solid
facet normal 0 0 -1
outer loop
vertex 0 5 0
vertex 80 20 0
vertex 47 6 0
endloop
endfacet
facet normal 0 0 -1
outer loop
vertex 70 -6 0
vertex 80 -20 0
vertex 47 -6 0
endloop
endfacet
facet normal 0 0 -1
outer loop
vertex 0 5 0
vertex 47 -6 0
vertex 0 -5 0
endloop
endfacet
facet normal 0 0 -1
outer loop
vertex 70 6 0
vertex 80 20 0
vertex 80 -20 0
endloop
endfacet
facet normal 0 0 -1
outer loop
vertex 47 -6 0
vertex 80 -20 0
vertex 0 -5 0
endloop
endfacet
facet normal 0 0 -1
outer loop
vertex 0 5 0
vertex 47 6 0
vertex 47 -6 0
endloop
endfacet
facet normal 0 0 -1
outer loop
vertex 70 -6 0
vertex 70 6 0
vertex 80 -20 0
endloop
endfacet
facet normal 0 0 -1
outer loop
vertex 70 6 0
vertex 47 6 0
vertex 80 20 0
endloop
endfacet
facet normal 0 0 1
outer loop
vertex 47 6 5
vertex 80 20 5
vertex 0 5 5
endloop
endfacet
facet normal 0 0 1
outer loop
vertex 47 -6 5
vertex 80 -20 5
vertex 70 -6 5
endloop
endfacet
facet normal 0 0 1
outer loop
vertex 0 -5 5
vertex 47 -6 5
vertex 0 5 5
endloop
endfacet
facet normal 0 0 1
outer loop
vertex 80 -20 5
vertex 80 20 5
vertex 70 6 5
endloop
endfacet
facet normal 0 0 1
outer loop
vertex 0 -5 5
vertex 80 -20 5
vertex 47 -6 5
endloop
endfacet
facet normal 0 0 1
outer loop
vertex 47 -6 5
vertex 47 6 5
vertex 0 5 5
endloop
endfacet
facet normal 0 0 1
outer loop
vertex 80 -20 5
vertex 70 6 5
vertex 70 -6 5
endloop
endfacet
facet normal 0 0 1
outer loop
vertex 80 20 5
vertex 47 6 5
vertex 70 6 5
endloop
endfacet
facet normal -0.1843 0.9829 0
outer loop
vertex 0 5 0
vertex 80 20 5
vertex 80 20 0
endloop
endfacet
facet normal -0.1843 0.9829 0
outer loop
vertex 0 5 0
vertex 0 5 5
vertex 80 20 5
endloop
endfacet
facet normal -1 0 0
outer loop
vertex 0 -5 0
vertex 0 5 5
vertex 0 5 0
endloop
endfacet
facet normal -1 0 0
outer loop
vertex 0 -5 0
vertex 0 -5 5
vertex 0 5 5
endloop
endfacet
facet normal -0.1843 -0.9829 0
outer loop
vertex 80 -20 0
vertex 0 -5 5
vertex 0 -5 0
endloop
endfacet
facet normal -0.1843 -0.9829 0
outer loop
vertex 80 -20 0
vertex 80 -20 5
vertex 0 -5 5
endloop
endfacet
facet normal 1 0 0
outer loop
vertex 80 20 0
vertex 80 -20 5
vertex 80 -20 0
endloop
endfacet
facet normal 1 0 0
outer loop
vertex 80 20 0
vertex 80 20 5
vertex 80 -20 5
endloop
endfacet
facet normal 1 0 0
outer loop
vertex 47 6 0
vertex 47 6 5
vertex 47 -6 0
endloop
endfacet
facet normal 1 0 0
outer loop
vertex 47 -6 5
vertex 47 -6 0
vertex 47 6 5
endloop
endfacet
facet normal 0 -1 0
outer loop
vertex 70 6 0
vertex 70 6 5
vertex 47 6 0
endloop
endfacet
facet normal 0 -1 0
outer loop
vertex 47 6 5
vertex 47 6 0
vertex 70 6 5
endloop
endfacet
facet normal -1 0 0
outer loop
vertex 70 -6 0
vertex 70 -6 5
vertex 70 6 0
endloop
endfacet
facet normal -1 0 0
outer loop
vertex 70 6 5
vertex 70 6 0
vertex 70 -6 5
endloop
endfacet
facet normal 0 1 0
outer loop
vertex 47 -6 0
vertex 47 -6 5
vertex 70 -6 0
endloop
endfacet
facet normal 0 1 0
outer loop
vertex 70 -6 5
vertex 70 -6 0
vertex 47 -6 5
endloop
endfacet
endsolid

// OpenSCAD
linear_extrude(height =5){
    difference() {
        polygon(points=[[0,-5],[0,5],[80,20],[80,-20]]);
        polygon(points=[[70,-6],[70,6],[47,6],[47,-6]]);
    }
}
